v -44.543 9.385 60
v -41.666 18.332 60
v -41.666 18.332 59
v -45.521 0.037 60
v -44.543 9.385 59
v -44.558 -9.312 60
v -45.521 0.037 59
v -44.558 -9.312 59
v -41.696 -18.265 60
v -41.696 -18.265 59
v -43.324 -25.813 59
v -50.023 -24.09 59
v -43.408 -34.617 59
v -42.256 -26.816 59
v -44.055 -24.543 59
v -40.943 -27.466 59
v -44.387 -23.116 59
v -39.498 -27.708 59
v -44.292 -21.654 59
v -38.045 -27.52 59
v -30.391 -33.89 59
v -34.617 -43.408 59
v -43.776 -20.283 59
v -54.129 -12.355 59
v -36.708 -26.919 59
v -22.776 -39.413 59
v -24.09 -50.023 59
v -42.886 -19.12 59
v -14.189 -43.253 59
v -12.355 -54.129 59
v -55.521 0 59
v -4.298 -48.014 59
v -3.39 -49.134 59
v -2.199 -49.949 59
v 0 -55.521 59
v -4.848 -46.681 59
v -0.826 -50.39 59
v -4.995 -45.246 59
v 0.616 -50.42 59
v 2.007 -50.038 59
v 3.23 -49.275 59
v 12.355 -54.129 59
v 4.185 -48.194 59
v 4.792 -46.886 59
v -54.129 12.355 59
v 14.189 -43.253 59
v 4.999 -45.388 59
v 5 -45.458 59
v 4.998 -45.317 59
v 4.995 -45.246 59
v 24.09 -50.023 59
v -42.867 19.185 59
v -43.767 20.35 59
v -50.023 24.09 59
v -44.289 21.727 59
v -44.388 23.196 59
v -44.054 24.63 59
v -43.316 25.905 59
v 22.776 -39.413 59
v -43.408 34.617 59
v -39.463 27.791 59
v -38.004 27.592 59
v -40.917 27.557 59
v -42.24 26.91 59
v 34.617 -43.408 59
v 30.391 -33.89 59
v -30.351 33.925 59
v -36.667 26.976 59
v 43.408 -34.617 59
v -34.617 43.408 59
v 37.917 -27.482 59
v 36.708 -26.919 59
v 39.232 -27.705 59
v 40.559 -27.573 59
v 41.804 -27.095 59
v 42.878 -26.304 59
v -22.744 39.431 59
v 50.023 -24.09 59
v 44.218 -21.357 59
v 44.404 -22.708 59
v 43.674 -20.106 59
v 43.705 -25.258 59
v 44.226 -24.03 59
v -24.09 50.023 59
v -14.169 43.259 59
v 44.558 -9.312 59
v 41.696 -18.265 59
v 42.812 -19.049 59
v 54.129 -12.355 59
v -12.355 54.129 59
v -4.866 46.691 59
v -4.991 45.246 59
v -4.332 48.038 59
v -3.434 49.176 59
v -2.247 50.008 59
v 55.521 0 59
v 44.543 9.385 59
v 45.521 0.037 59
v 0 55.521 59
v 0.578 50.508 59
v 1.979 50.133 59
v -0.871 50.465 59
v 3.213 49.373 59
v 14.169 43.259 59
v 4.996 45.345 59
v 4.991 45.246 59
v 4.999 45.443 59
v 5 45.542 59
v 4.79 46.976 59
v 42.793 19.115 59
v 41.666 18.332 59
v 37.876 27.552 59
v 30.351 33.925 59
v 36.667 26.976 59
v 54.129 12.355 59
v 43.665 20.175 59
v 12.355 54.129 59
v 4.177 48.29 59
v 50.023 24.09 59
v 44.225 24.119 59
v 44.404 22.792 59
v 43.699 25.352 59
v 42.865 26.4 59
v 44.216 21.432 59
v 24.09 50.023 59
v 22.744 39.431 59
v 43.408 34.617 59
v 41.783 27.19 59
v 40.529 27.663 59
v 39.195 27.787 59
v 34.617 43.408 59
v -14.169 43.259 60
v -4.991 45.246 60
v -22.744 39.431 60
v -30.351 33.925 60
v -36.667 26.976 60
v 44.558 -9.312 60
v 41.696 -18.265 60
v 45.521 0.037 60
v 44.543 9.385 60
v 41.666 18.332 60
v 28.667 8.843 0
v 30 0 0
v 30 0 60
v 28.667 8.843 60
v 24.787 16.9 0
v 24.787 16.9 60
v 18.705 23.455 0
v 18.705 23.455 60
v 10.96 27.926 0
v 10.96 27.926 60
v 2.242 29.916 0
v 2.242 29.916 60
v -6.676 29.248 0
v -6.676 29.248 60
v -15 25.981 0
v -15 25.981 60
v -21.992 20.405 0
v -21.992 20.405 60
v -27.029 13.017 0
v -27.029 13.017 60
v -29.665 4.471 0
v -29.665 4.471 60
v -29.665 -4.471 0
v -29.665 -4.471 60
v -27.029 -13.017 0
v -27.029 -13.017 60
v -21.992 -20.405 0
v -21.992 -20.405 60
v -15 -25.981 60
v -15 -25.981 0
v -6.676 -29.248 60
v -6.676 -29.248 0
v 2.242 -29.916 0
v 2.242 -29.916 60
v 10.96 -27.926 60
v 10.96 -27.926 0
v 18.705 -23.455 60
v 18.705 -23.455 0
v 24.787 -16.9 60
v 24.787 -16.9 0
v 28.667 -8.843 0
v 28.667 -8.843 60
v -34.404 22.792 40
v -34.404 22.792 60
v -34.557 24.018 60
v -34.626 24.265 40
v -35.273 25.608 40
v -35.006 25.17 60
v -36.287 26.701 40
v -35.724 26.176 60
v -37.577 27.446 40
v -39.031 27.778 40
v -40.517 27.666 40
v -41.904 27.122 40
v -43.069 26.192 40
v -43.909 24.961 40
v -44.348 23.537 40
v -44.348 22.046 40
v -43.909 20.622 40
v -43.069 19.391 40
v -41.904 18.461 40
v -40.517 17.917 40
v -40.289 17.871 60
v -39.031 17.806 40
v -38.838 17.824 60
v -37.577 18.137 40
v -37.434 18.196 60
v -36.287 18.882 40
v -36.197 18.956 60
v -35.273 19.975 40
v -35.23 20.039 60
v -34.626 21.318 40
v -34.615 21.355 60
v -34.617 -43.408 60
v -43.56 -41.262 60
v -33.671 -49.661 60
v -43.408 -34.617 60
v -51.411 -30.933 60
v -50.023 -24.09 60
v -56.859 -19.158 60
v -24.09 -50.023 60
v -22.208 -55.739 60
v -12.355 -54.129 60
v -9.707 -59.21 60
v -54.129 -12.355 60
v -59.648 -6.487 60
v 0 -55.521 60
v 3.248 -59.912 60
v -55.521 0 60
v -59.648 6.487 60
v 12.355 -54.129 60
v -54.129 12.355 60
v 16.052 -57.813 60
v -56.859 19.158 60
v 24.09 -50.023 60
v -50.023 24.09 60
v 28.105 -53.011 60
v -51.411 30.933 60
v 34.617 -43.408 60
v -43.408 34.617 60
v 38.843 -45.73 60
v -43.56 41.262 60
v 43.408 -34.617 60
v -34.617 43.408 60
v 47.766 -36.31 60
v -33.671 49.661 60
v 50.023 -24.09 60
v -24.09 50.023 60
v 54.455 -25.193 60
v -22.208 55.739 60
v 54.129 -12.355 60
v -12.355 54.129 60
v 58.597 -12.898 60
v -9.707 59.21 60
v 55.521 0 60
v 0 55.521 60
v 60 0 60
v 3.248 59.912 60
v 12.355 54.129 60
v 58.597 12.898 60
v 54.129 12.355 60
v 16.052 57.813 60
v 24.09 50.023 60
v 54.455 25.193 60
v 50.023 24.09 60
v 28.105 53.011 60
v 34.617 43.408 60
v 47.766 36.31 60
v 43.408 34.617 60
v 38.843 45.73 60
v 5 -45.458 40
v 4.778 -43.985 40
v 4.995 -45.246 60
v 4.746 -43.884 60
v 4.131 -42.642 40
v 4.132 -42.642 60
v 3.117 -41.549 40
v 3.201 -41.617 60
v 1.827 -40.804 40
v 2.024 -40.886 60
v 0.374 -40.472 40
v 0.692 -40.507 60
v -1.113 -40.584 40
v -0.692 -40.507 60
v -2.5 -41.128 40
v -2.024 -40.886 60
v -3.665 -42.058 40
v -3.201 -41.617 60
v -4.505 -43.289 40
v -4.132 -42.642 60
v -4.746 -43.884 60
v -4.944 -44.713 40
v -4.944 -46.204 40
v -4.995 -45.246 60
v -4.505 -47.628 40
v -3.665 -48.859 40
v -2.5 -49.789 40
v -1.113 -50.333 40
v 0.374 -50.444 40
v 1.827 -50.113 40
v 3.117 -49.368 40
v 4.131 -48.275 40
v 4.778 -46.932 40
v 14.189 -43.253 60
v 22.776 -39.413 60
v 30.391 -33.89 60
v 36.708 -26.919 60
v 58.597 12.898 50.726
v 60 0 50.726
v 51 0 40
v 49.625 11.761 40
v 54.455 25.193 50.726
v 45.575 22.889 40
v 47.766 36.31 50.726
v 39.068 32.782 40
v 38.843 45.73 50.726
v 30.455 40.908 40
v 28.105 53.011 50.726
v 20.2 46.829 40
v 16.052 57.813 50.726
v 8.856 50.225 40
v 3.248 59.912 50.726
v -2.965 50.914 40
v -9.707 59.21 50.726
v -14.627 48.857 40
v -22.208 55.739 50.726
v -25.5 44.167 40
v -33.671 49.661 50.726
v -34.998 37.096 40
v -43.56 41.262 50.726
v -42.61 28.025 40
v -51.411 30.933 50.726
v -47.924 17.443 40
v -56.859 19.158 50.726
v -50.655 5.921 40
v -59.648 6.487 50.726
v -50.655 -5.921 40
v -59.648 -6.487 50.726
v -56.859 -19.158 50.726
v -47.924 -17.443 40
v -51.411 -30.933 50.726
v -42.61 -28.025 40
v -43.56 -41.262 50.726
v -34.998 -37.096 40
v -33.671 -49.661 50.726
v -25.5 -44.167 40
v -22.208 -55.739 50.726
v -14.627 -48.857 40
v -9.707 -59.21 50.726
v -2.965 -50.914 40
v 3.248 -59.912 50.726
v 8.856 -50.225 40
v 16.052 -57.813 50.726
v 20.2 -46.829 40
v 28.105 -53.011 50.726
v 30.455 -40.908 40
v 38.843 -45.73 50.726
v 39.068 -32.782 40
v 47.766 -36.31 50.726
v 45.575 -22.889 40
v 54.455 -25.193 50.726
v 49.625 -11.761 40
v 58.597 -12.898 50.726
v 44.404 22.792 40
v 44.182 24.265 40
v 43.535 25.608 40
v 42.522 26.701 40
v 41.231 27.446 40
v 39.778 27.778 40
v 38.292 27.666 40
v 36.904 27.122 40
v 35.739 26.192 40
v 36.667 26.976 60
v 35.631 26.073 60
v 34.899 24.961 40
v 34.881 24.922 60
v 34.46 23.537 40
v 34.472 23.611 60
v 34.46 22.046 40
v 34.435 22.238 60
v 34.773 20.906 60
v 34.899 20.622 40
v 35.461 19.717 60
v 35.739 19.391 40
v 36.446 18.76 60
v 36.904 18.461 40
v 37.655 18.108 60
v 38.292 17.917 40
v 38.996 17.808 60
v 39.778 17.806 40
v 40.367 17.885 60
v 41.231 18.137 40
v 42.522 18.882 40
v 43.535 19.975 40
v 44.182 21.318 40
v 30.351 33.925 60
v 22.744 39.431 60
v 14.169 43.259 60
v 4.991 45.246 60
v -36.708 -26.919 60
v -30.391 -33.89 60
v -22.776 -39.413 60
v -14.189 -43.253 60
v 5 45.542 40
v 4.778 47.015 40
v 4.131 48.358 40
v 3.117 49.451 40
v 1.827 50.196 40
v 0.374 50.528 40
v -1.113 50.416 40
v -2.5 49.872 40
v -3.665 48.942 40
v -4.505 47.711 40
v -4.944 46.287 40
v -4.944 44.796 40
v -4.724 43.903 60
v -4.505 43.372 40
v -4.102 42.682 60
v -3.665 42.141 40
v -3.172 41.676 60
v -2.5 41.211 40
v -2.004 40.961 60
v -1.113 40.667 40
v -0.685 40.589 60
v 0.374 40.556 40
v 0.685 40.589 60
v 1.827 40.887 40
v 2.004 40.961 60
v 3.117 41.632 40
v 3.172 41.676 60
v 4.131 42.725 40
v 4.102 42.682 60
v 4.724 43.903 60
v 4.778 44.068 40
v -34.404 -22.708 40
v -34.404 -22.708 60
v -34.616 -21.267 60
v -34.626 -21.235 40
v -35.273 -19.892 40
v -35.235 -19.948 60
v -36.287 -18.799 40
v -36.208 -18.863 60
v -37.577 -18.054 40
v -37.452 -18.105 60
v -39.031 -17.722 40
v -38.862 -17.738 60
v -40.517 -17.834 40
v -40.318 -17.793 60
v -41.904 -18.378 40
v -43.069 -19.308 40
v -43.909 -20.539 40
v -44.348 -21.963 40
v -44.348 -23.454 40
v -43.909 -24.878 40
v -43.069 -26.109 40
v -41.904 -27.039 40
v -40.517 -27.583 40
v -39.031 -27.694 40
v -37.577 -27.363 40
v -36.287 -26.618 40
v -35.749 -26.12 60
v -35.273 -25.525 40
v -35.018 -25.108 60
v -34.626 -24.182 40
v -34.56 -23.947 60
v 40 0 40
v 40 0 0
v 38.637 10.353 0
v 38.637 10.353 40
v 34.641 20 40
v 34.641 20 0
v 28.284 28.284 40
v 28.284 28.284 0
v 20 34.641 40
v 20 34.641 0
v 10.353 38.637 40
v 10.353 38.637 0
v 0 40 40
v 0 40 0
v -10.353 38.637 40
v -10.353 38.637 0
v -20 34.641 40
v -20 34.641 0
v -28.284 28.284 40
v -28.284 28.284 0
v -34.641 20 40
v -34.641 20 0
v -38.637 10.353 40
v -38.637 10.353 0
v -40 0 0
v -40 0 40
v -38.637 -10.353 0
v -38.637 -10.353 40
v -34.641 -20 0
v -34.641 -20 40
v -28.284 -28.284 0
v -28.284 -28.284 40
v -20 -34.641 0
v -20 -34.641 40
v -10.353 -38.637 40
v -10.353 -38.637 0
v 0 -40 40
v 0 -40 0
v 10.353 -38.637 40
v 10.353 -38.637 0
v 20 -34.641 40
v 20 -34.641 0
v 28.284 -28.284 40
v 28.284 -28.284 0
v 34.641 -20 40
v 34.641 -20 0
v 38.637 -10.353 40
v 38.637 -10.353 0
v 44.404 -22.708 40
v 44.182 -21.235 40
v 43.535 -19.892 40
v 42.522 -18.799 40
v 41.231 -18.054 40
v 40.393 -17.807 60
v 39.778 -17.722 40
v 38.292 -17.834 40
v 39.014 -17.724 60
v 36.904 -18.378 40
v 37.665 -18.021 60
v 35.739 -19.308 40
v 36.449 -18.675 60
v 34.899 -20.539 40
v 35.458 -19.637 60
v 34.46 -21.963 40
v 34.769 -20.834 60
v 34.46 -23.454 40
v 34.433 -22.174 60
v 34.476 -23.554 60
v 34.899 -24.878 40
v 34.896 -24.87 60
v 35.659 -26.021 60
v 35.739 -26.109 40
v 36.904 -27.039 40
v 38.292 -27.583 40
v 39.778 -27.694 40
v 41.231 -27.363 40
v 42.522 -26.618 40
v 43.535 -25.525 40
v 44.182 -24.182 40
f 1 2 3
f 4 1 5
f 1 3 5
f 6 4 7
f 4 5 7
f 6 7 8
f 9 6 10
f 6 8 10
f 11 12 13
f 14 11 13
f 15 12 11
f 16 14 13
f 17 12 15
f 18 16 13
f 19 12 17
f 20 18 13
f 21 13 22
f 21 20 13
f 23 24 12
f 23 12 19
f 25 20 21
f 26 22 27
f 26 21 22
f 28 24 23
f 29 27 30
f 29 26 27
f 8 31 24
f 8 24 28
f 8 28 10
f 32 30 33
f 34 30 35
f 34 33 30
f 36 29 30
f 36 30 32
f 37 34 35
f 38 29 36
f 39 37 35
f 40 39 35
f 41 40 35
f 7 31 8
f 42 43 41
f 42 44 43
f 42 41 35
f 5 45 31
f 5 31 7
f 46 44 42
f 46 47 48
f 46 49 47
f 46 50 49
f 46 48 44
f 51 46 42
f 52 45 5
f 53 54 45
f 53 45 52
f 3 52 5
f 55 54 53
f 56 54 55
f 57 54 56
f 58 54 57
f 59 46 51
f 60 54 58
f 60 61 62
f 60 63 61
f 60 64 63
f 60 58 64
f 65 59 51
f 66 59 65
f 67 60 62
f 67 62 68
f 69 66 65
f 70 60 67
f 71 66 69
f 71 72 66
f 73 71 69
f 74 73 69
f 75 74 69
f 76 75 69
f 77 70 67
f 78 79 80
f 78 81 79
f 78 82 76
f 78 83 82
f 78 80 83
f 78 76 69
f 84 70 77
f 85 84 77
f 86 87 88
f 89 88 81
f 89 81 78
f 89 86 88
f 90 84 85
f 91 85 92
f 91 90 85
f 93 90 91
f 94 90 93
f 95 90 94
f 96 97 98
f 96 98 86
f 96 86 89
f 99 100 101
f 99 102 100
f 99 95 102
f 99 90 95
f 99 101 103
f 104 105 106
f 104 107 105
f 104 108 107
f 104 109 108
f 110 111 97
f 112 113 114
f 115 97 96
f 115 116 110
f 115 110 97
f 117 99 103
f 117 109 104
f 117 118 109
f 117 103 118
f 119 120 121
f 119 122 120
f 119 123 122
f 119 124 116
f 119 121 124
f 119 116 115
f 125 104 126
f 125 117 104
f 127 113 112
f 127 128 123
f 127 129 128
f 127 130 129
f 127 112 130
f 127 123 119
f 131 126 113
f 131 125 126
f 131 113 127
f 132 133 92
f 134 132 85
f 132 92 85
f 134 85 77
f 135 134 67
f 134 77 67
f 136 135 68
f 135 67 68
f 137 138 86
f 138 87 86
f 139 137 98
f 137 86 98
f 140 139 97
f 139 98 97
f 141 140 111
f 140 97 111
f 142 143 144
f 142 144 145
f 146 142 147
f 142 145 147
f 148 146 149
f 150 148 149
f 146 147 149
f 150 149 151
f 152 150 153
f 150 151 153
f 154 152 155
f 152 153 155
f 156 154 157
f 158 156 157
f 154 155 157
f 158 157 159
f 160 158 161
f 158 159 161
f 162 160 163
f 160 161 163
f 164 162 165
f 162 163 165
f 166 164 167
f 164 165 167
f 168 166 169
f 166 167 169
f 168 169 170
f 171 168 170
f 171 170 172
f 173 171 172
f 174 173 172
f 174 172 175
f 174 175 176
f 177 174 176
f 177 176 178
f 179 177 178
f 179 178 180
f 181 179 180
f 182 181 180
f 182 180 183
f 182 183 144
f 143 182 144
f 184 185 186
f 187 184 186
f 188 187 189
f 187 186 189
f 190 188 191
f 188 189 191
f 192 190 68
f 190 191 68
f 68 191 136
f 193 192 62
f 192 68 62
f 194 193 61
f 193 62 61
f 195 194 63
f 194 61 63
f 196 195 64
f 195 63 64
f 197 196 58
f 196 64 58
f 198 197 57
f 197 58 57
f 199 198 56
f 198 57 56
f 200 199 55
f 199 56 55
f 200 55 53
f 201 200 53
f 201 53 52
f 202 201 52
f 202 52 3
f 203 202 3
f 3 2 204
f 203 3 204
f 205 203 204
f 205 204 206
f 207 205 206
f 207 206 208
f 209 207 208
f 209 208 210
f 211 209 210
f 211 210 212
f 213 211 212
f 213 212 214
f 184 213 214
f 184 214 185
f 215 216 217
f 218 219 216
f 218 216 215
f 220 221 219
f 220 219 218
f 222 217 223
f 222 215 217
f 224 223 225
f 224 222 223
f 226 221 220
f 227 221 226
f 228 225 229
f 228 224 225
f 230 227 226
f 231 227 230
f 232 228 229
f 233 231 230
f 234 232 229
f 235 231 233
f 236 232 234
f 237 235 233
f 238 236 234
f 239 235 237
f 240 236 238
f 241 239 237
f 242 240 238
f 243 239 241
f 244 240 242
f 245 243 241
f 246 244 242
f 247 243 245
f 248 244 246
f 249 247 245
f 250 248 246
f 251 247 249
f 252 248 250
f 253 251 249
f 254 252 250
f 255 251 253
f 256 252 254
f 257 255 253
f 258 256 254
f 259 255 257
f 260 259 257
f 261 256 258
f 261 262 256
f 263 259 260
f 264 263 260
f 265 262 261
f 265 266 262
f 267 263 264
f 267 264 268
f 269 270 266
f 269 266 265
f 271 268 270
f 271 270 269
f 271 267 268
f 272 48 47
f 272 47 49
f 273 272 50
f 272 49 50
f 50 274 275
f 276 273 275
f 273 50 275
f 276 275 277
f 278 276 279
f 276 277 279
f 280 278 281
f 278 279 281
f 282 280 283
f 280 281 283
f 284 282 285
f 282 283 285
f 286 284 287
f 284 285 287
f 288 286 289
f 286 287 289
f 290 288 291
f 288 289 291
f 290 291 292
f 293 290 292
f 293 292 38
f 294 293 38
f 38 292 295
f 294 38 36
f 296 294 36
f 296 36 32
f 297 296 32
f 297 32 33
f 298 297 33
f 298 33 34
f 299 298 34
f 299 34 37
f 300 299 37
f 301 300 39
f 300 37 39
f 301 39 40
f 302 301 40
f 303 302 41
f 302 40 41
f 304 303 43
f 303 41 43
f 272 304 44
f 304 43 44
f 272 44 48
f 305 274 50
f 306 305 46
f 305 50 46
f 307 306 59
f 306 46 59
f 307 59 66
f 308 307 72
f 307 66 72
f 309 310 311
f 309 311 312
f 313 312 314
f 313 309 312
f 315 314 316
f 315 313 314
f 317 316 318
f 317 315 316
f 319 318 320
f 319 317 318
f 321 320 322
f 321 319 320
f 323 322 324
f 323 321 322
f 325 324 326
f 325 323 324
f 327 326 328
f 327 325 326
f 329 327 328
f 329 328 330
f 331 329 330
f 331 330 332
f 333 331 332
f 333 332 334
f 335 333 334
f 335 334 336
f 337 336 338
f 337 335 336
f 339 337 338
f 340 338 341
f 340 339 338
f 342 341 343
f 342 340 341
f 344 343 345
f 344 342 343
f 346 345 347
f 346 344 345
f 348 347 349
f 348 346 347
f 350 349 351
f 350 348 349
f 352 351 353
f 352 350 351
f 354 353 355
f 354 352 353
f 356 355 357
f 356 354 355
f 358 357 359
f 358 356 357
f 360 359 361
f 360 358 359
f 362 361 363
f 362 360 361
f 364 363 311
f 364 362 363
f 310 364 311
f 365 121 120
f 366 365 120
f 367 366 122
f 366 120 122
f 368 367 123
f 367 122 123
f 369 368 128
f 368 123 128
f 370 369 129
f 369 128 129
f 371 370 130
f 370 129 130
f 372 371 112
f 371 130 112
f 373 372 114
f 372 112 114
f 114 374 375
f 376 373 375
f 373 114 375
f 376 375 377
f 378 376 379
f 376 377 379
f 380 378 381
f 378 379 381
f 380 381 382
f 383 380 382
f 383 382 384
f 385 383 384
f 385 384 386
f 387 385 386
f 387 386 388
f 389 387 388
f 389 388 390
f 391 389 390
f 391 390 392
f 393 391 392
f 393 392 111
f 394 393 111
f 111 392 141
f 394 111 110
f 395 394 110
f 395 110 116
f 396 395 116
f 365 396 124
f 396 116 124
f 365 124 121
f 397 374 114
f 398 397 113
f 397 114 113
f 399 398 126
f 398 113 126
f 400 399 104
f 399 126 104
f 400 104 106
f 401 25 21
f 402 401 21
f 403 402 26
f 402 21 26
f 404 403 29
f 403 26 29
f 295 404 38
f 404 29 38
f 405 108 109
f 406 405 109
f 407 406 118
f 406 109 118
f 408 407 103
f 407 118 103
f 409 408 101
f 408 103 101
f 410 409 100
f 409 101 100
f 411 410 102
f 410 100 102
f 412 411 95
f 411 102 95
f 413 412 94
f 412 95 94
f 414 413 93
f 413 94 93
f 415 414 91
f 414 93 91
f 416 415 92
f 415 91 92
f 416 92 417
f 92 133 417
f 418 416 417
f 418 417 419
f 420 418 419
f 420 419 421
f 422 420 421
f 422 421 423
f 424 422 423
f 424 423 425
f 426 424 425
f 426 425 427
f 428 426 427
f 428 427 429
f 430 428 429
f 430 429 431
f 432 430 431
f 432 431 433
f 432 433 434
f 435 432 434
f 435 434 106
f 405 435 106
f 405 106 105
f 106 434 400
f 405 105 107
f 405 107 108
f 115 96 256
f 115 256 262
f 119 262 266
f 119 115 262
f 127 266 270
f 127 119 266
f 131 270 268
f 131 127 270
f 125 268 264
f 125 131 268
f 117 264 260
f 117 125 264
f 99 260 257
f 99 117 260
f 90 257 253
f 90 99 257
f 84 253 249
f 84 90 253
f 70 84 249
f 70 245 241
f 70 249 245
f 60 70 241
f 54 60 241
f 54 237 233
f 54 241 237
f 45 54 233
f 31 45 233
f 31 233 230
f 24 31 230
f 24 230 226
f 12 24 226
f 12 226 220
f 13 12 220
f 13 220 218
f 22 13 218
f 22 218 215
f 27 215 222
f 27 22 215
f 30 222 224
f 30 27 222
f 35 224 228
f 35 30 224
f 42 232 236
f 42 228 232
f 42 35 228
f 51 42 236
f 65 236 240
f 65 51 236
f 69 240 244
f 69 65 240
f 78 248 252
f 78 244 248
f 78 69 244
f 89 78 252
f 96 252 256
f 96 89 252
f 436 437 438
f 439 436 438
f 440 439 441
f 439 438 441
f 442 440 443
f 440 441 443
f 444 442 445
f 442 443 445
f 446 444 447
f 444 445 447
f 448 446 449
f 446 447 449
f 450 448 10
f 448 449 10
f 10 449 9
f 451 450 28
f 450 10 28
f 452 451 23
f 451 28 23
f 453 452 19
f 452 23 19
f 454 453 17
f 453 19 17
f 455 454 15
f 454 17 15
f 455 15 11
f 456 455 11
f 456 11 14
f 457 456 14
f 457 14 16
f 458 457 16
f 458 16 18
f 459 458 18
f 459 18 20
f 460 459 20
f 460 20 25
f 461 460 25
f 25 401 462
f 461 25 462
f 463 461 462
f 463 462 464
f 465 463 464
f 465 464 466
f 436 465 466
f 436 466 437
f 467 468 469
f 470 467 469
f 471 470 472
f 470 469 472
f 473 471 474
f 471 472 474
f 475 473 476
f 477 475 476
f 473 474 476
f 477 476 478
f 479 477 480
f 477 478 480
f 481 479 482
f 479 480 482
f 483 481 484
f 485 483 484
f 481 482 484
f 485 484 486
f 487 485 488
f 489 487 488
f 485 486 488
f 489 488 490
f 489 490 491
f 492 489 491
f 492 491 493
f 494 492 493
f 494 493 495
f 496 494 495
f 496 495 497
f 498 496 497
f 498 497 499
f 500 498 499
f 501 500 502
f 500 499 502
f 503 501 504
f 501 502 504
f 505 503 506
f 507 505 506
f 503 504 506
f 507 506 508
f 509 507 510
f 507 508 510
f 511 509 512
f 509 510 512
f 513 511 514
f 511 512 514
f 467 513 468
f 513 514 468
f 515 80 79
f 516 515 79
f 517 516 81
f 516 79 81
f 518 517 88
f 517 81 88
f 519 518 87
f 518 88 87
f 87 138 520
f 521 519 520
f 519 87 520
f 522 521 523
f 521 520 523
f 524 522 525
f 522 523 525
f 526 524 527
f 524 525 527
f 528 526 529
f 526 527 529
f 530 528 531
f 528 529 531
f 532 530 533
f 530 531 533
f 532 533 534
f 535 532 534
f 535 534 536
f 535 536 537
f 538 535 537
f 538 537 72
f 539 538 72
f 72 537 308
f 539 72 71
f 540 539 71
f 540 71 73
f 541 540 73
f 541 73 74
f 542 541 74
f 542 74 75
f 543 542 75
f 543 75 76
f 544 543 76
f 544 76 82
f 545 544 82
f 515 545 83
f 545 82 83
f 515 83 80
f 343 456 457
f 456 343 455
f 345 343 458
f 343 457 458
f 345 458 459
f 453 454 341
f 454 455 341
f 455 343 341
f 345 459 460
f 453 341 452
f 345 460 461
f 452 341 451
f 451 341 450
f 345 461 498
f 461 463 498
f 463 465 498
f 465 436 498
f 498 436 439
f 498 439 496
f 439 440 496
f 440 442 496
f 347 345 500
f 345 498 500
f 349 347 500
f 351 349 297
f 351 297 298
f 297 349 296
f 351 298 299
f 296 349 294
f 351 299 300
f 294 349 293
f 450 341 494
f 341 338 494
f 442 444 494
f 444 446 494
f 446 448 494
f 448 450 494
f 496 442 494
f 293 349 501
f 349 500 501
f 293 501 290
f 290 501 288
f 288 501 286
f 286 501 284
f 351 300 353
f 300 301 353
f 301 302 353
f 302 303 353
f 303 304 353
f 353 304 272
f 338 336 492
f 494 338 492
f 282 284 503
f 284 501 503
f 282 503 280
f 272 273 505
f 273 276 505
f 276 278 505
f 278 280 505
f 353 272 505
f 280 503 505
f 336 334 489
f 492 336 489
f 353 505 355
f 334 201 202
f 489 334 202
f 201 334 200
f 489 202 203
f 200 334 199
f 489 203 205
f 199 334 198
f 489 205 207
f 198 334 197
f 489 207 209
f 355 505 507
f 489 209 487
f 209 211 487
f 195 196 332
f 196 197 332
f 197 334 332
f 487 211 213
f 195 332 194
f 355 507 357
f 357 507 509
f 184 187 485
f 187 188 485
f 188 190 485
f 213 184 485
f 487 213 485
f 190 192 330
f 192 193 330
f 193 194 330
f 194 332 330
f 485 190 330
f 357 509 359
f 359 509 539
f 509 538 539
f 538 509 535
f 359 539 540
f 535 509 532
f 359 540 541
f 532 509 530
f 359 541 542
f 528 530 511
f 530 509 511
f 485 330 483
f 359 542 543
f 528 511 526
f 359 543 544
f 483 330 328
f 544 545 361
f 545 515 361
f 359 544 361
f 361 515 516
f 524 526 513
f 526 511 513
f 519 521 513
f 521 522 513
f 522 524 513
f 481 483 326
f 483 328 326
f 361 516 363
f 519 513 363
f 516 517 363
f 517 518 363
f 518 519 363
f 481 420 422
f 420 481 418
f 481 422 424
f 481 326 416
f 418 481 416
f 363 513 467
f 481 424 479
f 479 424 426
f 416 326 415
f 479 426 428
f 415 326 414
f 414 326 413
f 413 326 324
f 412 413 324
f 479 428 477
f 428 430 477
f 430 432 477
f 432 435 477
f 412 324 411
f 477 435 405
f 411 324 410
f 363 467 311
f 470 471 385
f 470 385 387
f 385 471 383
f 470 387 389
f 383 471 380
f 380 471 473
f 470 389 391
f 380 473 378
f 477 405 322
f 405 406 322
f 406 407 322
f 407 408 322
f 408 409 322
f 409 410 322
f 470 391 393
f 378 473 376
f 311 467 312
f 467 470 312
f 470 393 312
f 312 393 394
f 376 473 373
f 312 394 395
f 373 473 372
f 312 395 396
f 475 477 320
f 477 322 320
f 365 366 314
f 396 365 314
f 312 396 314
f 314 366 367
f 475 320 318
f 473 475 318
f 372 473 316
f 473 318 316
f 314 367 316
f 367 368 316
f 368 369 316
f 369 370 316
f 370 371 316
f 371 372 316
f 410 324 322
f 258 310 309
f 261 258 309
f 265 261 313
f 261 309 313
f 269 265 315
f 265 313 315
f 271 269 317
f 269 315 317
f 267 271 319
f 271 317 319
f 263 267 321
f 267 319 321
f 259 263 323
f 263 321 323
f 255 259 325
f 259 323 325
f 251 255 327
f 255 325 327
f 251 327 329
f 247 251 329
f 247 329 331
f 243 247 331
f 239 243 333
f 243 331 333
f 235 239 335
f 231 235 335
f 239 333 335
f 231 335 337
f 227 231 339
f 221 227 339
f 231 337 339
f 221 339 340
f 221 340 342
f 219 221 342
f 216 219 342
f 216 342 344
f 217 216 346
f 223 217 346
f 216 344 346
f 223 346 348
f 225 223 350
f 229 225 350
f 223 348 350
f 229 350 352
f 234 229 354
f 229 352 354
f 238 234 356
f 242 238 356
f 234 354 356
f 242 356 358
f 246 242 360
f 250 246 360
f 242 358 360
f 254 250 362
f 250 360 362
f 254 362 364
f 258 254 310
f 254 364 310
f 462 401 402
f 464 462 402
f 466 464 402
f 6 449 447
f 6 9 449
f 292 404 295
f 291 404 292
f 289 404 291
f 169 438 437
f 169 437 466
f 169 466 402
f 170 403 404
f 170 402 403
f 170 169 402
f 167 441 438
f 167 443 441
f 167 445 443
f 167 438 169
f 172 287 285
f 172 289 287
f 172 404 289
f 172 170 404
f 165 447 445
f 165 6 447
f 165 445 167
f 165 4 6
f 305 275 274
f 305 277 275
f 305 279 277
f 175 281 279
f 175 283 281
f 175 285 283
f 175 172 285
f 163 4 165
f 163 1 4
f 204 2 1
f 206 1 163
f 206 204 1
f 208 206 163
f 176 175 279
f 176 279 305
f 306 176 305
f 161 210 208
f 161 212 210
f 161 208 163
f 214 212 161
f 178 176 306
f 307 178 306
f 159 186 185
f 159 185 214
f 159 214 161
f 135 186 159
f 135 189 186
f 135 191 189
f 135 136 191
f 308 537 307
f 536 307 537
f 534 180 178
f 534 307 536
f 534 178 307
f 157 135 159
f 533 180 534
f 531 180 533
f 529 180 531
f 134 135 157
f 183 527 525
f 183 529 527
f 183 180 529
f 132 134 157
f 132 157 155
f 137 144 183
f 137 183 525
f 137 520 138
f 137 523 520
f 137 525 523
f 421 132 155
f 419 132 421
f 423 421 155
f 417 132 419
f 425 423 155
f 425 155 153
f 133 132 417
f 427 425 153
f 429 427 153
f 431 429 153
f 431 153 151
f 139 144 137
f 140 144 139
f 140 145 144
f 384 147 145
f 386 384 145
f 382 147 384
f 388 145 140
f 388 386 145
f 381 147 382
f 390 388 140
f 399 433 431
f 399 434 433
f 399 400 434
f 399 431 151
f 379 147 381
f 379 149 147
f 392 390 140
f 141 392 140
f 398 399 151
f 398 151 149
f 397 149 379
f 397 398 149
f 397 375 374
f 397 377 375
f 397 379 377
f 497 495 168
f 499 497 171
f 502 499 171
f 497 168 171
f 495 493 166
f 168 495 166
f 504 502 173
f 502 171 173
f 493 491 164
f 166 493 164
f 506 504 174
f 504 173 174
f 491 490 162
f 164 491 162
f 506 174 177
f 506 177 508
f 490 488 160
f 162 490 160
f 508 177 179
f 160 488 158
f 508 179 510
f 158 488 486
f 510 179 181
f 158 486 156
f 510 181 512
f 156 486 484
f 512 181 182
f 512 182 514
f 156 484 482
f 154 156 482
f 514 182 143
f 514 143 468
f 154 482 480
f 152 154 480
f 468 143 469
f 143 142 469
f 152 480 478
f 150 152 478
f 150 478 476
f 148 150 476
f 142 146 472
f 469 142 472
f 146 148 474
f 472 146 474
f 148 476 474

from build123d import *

# Parameters (mm, degrees)
SKETCH1_R                    = 40
SKETCH1_R_2                  = 27.5
BOSS_EXTRUDE1_DEPTH          = 40
SKETCH3_R                    = 60
BOSS_EXTRUDE2_DEPTH          = 20
SKETCH4_R                    = 30
SKETCH4_R_2                  = 5
CUT_EXTRUDE2_DEPTH           = 90
CHAMFER2_SIZE                = 9
CHAMFER2_SIZE2               = 10.725782333
CUT_EXTRUDE_THIN2_DEPTH      = 2
CUT_EXTRUDE_THIN2_DEPTH_BACK = 1
SKETCH6_R                    = 55.520808166
SKETCH6_R_2                  = 45.520808166


with BuildPart() as part:
    # Sketch1 → Boss-Extrude1 (new body)
    with BuildSketch(Plane.XY):
        Circle(SKETCH1_R)
        Circle(SKETCH1_R_2, mode=Mode.SUBTRACT)
    extrude(amount=BOSS_EXTRUDE1_DEPTH)

    # Sketch3 → Boss-Extrude2 (add)
    with BuildSketch(Plane.XY.offset(40)):
        Circle(SKETCH3_R)
    extrude(amount=BOSS_EXTRUDE2_DEPTH)

    # Sketch4 → Cut-Extrude2 (cut)
    with BuildSketch(Plane.XY.offset(60)):
        Circle(SKETCH4_R)
        with Locations((0, 45.541587837)):
            Circle(SKETCH4_R_2)
        with Locations((39.404155872, 22.791587837)):
            Circle(SKETCH4_R_2)
        with Locations((39.404155872, -22.708412163)):
            Circle(SKETCH4_R_2)
        with Locations((0, -45.458412163)):
            Circle(SKETCH4_R_2)
        with Locations((-39.404155872, -22.708412163)):
            Circle(SKETCH4_R_2)
        with Locations((-39.404155872, 22.791587837)):
            Circle(SKETCH4_R_2)
    extrude(amount=-CUT_EXTRUDE2_DEPTH, mode=Mode.SUBTRACT)

    # Chamfer2
    chamfer2_edges = [part.edges().sort_by_distance(p)[0] for p in [
        (-60, 0, 40),
    ]]
    chamfer2_side = [part.faces().sort_by_distance(p)[0] for p in [
        (-58.302943725, 0, 40),
    ]]
    chamfer(chamfer2_edges, length=CHAMFER2_SIZE, length2=CHAMFER2_SIZE2, reference=chamfer2_side[0])

    # Sketch6 → Cut-Extrude-Thin2 (cut, two sides: drawn at the far end of the back side and taken through both)
    with BuildSketch(Plane.XY.offset(60).offset(-CUT_EXTRUDE_THIN2_DEPTH_BACK)):
        Circle(SKETCH6_R)
        Circle(SKETCH6_R_2, mode=Mode.SUBTRACT)
    extrude(amount=CUT_EXTRUDE_THIN2_DEPTH + CUT_EXTRUDE_THIN2_DEPTH_BACK, mode=Mode.SUBTRACT)


solid = part.part
